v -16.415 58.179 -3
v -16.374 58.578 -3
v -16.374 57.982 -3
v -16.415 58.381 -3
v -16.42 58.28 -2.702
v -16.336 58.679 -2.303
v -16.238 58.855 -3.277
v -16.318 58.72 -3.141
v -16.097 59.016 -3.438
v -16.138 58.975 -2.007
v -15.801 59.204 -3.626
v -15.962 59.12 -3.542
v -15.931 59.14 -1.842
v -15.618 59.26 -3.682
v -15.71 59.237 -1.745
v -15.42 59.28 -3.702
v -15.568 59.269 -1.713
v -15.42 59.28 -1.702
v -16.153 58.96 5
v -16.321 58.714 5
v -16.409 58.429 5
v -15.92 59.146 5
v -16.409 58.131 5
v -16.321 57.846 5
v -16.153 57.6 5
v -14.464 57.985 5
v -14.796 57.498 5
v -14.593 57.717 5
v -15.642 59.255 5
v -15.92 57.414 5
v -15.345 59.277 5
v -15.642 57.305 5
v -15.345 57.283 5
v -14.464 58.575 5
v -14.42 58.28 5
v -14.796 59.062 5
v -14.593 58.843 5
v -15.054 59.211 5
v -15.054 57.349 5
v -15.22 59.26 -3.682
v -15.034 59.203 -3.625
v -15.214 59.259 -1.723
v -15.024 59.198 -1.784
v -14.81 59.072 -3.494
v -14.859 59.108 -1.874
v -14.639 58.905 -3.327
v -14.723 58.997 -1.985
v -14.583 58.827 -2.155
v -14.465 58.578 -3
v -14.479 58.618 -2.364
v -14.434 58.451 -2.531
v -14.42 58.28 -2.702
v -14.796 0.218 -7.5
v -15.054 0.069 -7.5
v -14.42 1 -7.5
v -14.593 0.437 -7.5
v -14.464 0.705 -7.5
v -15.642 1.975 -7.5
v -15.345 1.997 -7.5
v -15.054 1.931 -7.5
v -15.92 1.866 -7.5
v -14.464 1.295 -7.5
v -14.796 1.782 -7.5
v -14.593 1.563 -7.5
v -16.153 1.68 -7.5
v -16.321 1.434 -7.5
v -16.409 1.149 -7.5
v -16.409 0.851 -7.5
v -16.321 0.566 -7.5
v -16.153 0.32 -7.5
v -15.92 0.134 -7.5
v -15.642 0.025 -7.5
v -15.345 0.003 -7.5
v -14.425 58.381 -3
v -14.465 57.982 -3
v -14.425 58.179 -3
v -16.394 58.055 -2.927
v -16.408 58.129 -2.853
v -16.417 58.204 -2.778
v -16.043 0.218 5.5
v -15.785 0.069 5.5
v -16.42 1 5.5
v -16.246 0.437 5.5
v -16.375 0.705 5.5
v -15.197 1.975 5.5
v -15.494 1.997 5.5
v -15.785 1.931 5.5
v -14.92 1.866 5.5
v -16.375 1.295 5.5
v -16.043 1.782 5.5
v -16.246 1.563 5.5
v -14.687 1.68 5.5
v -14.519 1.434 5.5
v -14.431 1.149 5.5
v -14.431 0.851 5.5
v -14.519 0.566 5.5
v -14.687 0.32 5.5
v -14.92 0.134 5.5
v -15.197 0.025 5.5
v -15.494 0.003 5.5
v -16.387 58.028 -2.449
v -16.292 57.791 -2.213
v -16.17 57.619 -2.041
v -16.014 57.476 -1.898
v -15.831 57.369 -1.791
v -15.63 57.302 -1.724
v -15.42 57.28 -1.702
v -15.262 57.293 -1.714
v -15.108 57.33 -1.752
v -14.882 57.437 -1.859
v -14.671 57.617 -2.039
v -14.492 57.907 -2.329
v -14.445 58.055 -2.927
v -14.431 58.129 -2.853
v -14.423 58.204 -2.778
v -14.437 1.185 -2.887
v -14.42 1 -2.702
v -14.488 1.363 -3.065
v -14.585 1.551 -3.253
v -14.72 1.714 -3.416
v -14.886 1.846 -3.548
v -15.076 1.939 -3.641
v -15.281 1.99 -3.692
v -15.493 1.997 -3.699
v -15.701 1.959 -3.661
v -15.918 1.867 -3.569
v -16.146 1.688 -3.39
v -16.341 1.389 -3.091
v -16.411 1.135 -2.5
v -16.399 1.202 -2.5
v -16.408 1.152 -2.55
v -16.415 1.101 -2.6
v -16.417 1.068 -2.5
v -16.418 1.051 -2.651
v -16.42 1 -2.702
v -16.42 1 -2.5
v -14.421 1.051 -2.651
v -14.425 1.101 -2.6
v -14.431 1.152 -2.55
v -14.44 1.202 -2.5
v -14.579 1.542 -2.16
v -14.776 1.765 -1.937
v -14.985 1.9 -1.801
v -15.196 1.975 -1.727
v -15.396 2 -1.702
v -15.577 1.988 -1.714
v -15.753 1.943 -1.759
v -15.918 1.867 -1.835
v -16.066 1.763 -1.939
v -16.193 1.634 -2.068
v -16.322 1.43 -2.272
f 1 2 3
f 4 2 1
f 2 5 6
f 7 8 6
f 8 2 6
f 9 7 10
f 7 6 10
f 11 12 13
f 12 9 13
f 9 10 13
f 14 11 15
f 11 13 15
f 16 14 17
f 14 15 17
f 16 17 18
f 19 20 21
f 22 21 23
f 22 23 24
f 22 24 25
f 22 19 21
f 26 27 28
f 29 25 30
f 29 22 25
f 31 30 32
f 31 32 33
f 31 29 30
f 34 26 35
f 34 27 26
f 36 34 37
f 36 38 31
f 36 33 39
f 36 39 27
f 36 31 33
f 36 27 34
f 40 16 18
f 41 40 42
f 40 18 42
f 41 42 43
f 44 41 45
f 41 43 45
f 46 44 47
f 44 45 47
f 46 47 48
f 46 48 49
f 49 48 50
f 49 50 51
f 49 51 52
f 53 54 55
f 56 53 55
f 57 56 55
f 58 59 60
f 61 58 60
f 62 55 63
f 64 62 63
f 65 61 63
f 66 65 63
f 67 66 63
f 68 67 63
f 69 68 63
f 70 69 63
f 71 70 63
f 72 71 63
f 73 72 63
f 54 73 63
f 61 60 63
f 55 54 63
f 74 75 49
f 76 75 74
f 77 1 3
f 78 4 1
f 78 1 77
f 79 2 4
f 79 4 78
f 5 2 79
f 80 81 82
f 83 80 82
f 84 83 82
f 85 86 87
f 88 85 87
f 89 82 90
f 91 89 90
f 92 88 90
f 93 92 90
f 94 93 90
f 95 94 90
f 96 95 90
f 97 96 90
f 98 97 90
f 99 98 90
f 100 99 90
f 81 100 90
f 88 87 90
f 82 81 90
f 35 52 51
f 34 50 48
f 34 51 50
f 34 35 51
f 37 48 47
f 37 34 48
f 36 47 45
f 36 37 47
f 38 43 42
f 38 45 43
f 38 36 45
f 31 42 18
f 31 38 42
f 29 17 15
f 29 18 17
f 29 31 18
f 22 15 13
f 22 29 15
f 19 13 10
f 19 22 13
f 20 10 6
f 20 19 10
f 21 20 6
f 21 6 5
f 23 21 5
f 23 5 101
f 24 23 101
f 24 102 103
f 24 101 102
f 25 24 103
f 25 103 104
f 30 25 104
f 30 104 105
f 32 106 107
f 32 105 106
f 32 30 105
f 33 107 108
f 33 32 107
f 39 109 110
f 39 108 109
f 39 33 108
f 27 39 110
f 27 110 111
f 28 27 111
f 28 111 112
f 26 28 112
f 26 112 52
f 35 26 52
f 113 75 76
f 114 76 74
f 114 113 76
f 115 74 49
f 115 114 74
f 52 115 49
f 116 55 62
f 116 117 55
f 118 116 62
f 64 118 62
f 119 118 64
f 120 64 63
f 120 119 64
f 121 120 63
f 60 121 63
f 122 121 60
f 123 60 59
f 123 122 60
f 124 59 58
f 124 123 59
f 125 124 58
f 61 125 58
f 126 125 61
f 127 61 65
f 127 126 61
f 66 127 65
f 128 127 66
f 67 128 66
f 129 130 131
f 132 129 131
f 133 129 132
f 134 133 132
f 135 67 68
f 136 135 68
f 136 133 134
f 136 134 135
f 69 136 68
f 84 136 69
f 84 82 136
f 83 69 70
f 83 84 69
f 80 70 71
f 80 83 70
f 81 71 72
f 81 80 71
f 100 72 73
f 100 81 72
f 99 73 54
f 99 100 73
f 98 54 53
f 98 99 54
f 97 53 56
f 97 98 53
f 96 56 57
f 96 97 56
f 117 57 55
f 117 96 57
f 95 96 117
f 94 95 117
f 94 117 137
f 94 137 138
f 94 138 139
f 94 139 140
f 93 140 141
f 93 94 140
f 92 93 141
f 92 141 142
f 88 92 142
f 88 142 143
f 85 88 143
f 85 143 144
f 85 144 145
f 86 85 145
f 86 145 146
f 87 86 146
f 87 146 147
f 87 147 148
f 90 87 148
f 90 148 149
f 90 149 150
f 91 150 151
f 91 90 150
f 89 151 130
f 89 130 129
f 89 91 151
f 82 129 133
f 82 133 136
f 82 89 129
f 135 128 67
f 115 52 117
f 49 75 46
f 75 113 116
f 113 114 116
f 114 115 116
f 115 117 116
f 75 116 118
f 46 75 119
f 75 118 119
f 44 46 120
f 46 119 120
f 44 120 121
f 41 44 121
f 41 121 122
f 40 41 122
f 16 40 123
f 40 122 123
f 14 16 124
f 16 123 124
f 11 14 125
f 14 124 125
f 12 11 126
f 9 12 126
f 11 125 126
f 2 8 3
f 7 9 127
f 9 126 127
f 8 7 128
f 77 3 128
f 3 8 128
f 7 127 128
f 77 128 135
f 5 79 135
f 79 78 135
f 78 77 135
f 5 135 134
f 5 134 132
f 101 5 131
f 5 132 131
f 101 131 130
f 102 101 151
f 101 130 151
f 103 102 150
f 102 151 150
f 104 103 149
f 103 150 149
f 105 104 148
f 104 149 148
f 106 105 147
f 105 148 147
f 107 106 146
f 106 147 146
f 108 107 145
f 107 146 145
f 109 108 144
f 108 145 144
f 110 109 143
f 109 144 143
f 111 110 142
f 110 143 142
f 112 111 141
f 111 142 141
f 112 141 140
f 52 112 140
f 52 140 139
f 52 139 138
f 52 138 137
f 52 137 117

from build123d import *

# Parameters (mm, degrees)
SKETCH1_R                = 1
BOSS_EXTRUDE1_DEPTH      = 59.28
CUT_EXTRUDE1_DEPTH       = 59.28
SKETCH3_R                = 1
BOSS_EXTRUDE2_DEPTH      = 5
BOSS_EXTRUDE2_DEPTH_BACK = 3
BOSS_EXTRUDE3_START      = -2.5
SKETCH4_R                = 1
BOSS_EXTRUDE3_DEPTH      = 5
CUT_EXTRUDE2_DEPTH       = 15
SKETCH6_R                = 1
BOSS_EXTRUDE4_DEPTH      = 13


with BuildPart() as part:
    # Sketch1 → Boss-Extrude1 (new body)
    with BuildSketch(Plane(origin=(0, 0, 0), x_dir=(1, 0, 0), z_dir=(0, 1, 0))):
        with Locations((-15.419703787, 2.701939454)):
            Circle(SKETCH1_R)
    extrude(amount=BOSS_EXTRUDE1_DEPTH)

    # Sketch2 → Cut-Extrude1 (cut)
    with BuildSketch(Plane.XY):
        with BuildLine():
            Line((-16.419703787, 59.28), (-16.419703787, 58.28))
            ThreePointArc((-16.419703787, 58.28), (-16.126810568, 58.987106781), (-15.419703787, 59.28))
            Line((-15.419703787, 59.28), (-16.419703787, 59.28))
        make_face()
        with BuildLine():
            ThreePointArc((-15.419703787, 59.28), (-14.712597006, 58.987106781), (-14.419703787, 58.28))
            Line((-14.419703787, 58.28), (-14.419703787, 59.28))
            Line((-14.419703787, 59.28), (-15.419703787, 59.28))
        make_face()
    extrude(amount=-CUT_EXTRUDE1_DEPTH, mode=Mode.SUBTRACT)

    # Sketch3 → Boss-Extrude2 (add, two sides)
    with BuildSketch(Plane.XY) as boss_extrude2_sk:
        with Locations((-15.419703787, 58.28)):
            Circle(SKETCH3_R)
    extrude(amount=BOSS_EXTRUDE2_DEPTH)
    extrude(boss_extrude2_sk.sketch, amount=-BOSS_EXTRUDE2_DEPTH_BACK)

    # Sketch4 → Boss-Extrude3 (add)
    with BuildSketch(Plane.XY.offset(BOSS_EXTRUDE3_START)):
        with Locations((-15.419703787, 1)):
            Circle(SKETCH4_R)
    extrude(amount=-BOSS_EXTRUDE3_DEPTH)

    # Sketch5 → Cut-Extrude2 (cut)
    with BuildSketch(Plane(origin=(0, 0, -7.5), x_dir=(-1, 0, 0), z_dir=(0, 0, -1))):
        with BuildLine():
            ThreePointArc((15.419703787, 0), (14.712597006, 0.292893219), (14.419703787, 1))
            Line((14.419703787, 1), (14.419703787, 0))
            Line((14.419703787, 0), (15.419703787, 0))
        make_face()
        with BuildLine():
            Line((16.419703787, 0), (16.419703787, 1))
            ThreePointArc((16.419703787, 1), (16.126810568, 0.292893219), (15.419703787, 0))
            Line((15.419703787, 0), (16.419703787, 0))
        make_face()
    extrude(amount=-CUT_EXTRUDE2_DEPTH, mode=Mode.SUBTRACT)

    # Sketch6 → Boss-Extrude4 (add)
    with BuildSketch(Plane(origin=(0, 0, -7.5), x_dir=(-1, 0, 0), z_dir=(0, 0, -1))):
        with Locations((15.419703787, 1)):
            Circle(SKETCH6_R)
    extrude(amount=-BOSS_EXTRUDE4_DEPTH)


solid = part.part
